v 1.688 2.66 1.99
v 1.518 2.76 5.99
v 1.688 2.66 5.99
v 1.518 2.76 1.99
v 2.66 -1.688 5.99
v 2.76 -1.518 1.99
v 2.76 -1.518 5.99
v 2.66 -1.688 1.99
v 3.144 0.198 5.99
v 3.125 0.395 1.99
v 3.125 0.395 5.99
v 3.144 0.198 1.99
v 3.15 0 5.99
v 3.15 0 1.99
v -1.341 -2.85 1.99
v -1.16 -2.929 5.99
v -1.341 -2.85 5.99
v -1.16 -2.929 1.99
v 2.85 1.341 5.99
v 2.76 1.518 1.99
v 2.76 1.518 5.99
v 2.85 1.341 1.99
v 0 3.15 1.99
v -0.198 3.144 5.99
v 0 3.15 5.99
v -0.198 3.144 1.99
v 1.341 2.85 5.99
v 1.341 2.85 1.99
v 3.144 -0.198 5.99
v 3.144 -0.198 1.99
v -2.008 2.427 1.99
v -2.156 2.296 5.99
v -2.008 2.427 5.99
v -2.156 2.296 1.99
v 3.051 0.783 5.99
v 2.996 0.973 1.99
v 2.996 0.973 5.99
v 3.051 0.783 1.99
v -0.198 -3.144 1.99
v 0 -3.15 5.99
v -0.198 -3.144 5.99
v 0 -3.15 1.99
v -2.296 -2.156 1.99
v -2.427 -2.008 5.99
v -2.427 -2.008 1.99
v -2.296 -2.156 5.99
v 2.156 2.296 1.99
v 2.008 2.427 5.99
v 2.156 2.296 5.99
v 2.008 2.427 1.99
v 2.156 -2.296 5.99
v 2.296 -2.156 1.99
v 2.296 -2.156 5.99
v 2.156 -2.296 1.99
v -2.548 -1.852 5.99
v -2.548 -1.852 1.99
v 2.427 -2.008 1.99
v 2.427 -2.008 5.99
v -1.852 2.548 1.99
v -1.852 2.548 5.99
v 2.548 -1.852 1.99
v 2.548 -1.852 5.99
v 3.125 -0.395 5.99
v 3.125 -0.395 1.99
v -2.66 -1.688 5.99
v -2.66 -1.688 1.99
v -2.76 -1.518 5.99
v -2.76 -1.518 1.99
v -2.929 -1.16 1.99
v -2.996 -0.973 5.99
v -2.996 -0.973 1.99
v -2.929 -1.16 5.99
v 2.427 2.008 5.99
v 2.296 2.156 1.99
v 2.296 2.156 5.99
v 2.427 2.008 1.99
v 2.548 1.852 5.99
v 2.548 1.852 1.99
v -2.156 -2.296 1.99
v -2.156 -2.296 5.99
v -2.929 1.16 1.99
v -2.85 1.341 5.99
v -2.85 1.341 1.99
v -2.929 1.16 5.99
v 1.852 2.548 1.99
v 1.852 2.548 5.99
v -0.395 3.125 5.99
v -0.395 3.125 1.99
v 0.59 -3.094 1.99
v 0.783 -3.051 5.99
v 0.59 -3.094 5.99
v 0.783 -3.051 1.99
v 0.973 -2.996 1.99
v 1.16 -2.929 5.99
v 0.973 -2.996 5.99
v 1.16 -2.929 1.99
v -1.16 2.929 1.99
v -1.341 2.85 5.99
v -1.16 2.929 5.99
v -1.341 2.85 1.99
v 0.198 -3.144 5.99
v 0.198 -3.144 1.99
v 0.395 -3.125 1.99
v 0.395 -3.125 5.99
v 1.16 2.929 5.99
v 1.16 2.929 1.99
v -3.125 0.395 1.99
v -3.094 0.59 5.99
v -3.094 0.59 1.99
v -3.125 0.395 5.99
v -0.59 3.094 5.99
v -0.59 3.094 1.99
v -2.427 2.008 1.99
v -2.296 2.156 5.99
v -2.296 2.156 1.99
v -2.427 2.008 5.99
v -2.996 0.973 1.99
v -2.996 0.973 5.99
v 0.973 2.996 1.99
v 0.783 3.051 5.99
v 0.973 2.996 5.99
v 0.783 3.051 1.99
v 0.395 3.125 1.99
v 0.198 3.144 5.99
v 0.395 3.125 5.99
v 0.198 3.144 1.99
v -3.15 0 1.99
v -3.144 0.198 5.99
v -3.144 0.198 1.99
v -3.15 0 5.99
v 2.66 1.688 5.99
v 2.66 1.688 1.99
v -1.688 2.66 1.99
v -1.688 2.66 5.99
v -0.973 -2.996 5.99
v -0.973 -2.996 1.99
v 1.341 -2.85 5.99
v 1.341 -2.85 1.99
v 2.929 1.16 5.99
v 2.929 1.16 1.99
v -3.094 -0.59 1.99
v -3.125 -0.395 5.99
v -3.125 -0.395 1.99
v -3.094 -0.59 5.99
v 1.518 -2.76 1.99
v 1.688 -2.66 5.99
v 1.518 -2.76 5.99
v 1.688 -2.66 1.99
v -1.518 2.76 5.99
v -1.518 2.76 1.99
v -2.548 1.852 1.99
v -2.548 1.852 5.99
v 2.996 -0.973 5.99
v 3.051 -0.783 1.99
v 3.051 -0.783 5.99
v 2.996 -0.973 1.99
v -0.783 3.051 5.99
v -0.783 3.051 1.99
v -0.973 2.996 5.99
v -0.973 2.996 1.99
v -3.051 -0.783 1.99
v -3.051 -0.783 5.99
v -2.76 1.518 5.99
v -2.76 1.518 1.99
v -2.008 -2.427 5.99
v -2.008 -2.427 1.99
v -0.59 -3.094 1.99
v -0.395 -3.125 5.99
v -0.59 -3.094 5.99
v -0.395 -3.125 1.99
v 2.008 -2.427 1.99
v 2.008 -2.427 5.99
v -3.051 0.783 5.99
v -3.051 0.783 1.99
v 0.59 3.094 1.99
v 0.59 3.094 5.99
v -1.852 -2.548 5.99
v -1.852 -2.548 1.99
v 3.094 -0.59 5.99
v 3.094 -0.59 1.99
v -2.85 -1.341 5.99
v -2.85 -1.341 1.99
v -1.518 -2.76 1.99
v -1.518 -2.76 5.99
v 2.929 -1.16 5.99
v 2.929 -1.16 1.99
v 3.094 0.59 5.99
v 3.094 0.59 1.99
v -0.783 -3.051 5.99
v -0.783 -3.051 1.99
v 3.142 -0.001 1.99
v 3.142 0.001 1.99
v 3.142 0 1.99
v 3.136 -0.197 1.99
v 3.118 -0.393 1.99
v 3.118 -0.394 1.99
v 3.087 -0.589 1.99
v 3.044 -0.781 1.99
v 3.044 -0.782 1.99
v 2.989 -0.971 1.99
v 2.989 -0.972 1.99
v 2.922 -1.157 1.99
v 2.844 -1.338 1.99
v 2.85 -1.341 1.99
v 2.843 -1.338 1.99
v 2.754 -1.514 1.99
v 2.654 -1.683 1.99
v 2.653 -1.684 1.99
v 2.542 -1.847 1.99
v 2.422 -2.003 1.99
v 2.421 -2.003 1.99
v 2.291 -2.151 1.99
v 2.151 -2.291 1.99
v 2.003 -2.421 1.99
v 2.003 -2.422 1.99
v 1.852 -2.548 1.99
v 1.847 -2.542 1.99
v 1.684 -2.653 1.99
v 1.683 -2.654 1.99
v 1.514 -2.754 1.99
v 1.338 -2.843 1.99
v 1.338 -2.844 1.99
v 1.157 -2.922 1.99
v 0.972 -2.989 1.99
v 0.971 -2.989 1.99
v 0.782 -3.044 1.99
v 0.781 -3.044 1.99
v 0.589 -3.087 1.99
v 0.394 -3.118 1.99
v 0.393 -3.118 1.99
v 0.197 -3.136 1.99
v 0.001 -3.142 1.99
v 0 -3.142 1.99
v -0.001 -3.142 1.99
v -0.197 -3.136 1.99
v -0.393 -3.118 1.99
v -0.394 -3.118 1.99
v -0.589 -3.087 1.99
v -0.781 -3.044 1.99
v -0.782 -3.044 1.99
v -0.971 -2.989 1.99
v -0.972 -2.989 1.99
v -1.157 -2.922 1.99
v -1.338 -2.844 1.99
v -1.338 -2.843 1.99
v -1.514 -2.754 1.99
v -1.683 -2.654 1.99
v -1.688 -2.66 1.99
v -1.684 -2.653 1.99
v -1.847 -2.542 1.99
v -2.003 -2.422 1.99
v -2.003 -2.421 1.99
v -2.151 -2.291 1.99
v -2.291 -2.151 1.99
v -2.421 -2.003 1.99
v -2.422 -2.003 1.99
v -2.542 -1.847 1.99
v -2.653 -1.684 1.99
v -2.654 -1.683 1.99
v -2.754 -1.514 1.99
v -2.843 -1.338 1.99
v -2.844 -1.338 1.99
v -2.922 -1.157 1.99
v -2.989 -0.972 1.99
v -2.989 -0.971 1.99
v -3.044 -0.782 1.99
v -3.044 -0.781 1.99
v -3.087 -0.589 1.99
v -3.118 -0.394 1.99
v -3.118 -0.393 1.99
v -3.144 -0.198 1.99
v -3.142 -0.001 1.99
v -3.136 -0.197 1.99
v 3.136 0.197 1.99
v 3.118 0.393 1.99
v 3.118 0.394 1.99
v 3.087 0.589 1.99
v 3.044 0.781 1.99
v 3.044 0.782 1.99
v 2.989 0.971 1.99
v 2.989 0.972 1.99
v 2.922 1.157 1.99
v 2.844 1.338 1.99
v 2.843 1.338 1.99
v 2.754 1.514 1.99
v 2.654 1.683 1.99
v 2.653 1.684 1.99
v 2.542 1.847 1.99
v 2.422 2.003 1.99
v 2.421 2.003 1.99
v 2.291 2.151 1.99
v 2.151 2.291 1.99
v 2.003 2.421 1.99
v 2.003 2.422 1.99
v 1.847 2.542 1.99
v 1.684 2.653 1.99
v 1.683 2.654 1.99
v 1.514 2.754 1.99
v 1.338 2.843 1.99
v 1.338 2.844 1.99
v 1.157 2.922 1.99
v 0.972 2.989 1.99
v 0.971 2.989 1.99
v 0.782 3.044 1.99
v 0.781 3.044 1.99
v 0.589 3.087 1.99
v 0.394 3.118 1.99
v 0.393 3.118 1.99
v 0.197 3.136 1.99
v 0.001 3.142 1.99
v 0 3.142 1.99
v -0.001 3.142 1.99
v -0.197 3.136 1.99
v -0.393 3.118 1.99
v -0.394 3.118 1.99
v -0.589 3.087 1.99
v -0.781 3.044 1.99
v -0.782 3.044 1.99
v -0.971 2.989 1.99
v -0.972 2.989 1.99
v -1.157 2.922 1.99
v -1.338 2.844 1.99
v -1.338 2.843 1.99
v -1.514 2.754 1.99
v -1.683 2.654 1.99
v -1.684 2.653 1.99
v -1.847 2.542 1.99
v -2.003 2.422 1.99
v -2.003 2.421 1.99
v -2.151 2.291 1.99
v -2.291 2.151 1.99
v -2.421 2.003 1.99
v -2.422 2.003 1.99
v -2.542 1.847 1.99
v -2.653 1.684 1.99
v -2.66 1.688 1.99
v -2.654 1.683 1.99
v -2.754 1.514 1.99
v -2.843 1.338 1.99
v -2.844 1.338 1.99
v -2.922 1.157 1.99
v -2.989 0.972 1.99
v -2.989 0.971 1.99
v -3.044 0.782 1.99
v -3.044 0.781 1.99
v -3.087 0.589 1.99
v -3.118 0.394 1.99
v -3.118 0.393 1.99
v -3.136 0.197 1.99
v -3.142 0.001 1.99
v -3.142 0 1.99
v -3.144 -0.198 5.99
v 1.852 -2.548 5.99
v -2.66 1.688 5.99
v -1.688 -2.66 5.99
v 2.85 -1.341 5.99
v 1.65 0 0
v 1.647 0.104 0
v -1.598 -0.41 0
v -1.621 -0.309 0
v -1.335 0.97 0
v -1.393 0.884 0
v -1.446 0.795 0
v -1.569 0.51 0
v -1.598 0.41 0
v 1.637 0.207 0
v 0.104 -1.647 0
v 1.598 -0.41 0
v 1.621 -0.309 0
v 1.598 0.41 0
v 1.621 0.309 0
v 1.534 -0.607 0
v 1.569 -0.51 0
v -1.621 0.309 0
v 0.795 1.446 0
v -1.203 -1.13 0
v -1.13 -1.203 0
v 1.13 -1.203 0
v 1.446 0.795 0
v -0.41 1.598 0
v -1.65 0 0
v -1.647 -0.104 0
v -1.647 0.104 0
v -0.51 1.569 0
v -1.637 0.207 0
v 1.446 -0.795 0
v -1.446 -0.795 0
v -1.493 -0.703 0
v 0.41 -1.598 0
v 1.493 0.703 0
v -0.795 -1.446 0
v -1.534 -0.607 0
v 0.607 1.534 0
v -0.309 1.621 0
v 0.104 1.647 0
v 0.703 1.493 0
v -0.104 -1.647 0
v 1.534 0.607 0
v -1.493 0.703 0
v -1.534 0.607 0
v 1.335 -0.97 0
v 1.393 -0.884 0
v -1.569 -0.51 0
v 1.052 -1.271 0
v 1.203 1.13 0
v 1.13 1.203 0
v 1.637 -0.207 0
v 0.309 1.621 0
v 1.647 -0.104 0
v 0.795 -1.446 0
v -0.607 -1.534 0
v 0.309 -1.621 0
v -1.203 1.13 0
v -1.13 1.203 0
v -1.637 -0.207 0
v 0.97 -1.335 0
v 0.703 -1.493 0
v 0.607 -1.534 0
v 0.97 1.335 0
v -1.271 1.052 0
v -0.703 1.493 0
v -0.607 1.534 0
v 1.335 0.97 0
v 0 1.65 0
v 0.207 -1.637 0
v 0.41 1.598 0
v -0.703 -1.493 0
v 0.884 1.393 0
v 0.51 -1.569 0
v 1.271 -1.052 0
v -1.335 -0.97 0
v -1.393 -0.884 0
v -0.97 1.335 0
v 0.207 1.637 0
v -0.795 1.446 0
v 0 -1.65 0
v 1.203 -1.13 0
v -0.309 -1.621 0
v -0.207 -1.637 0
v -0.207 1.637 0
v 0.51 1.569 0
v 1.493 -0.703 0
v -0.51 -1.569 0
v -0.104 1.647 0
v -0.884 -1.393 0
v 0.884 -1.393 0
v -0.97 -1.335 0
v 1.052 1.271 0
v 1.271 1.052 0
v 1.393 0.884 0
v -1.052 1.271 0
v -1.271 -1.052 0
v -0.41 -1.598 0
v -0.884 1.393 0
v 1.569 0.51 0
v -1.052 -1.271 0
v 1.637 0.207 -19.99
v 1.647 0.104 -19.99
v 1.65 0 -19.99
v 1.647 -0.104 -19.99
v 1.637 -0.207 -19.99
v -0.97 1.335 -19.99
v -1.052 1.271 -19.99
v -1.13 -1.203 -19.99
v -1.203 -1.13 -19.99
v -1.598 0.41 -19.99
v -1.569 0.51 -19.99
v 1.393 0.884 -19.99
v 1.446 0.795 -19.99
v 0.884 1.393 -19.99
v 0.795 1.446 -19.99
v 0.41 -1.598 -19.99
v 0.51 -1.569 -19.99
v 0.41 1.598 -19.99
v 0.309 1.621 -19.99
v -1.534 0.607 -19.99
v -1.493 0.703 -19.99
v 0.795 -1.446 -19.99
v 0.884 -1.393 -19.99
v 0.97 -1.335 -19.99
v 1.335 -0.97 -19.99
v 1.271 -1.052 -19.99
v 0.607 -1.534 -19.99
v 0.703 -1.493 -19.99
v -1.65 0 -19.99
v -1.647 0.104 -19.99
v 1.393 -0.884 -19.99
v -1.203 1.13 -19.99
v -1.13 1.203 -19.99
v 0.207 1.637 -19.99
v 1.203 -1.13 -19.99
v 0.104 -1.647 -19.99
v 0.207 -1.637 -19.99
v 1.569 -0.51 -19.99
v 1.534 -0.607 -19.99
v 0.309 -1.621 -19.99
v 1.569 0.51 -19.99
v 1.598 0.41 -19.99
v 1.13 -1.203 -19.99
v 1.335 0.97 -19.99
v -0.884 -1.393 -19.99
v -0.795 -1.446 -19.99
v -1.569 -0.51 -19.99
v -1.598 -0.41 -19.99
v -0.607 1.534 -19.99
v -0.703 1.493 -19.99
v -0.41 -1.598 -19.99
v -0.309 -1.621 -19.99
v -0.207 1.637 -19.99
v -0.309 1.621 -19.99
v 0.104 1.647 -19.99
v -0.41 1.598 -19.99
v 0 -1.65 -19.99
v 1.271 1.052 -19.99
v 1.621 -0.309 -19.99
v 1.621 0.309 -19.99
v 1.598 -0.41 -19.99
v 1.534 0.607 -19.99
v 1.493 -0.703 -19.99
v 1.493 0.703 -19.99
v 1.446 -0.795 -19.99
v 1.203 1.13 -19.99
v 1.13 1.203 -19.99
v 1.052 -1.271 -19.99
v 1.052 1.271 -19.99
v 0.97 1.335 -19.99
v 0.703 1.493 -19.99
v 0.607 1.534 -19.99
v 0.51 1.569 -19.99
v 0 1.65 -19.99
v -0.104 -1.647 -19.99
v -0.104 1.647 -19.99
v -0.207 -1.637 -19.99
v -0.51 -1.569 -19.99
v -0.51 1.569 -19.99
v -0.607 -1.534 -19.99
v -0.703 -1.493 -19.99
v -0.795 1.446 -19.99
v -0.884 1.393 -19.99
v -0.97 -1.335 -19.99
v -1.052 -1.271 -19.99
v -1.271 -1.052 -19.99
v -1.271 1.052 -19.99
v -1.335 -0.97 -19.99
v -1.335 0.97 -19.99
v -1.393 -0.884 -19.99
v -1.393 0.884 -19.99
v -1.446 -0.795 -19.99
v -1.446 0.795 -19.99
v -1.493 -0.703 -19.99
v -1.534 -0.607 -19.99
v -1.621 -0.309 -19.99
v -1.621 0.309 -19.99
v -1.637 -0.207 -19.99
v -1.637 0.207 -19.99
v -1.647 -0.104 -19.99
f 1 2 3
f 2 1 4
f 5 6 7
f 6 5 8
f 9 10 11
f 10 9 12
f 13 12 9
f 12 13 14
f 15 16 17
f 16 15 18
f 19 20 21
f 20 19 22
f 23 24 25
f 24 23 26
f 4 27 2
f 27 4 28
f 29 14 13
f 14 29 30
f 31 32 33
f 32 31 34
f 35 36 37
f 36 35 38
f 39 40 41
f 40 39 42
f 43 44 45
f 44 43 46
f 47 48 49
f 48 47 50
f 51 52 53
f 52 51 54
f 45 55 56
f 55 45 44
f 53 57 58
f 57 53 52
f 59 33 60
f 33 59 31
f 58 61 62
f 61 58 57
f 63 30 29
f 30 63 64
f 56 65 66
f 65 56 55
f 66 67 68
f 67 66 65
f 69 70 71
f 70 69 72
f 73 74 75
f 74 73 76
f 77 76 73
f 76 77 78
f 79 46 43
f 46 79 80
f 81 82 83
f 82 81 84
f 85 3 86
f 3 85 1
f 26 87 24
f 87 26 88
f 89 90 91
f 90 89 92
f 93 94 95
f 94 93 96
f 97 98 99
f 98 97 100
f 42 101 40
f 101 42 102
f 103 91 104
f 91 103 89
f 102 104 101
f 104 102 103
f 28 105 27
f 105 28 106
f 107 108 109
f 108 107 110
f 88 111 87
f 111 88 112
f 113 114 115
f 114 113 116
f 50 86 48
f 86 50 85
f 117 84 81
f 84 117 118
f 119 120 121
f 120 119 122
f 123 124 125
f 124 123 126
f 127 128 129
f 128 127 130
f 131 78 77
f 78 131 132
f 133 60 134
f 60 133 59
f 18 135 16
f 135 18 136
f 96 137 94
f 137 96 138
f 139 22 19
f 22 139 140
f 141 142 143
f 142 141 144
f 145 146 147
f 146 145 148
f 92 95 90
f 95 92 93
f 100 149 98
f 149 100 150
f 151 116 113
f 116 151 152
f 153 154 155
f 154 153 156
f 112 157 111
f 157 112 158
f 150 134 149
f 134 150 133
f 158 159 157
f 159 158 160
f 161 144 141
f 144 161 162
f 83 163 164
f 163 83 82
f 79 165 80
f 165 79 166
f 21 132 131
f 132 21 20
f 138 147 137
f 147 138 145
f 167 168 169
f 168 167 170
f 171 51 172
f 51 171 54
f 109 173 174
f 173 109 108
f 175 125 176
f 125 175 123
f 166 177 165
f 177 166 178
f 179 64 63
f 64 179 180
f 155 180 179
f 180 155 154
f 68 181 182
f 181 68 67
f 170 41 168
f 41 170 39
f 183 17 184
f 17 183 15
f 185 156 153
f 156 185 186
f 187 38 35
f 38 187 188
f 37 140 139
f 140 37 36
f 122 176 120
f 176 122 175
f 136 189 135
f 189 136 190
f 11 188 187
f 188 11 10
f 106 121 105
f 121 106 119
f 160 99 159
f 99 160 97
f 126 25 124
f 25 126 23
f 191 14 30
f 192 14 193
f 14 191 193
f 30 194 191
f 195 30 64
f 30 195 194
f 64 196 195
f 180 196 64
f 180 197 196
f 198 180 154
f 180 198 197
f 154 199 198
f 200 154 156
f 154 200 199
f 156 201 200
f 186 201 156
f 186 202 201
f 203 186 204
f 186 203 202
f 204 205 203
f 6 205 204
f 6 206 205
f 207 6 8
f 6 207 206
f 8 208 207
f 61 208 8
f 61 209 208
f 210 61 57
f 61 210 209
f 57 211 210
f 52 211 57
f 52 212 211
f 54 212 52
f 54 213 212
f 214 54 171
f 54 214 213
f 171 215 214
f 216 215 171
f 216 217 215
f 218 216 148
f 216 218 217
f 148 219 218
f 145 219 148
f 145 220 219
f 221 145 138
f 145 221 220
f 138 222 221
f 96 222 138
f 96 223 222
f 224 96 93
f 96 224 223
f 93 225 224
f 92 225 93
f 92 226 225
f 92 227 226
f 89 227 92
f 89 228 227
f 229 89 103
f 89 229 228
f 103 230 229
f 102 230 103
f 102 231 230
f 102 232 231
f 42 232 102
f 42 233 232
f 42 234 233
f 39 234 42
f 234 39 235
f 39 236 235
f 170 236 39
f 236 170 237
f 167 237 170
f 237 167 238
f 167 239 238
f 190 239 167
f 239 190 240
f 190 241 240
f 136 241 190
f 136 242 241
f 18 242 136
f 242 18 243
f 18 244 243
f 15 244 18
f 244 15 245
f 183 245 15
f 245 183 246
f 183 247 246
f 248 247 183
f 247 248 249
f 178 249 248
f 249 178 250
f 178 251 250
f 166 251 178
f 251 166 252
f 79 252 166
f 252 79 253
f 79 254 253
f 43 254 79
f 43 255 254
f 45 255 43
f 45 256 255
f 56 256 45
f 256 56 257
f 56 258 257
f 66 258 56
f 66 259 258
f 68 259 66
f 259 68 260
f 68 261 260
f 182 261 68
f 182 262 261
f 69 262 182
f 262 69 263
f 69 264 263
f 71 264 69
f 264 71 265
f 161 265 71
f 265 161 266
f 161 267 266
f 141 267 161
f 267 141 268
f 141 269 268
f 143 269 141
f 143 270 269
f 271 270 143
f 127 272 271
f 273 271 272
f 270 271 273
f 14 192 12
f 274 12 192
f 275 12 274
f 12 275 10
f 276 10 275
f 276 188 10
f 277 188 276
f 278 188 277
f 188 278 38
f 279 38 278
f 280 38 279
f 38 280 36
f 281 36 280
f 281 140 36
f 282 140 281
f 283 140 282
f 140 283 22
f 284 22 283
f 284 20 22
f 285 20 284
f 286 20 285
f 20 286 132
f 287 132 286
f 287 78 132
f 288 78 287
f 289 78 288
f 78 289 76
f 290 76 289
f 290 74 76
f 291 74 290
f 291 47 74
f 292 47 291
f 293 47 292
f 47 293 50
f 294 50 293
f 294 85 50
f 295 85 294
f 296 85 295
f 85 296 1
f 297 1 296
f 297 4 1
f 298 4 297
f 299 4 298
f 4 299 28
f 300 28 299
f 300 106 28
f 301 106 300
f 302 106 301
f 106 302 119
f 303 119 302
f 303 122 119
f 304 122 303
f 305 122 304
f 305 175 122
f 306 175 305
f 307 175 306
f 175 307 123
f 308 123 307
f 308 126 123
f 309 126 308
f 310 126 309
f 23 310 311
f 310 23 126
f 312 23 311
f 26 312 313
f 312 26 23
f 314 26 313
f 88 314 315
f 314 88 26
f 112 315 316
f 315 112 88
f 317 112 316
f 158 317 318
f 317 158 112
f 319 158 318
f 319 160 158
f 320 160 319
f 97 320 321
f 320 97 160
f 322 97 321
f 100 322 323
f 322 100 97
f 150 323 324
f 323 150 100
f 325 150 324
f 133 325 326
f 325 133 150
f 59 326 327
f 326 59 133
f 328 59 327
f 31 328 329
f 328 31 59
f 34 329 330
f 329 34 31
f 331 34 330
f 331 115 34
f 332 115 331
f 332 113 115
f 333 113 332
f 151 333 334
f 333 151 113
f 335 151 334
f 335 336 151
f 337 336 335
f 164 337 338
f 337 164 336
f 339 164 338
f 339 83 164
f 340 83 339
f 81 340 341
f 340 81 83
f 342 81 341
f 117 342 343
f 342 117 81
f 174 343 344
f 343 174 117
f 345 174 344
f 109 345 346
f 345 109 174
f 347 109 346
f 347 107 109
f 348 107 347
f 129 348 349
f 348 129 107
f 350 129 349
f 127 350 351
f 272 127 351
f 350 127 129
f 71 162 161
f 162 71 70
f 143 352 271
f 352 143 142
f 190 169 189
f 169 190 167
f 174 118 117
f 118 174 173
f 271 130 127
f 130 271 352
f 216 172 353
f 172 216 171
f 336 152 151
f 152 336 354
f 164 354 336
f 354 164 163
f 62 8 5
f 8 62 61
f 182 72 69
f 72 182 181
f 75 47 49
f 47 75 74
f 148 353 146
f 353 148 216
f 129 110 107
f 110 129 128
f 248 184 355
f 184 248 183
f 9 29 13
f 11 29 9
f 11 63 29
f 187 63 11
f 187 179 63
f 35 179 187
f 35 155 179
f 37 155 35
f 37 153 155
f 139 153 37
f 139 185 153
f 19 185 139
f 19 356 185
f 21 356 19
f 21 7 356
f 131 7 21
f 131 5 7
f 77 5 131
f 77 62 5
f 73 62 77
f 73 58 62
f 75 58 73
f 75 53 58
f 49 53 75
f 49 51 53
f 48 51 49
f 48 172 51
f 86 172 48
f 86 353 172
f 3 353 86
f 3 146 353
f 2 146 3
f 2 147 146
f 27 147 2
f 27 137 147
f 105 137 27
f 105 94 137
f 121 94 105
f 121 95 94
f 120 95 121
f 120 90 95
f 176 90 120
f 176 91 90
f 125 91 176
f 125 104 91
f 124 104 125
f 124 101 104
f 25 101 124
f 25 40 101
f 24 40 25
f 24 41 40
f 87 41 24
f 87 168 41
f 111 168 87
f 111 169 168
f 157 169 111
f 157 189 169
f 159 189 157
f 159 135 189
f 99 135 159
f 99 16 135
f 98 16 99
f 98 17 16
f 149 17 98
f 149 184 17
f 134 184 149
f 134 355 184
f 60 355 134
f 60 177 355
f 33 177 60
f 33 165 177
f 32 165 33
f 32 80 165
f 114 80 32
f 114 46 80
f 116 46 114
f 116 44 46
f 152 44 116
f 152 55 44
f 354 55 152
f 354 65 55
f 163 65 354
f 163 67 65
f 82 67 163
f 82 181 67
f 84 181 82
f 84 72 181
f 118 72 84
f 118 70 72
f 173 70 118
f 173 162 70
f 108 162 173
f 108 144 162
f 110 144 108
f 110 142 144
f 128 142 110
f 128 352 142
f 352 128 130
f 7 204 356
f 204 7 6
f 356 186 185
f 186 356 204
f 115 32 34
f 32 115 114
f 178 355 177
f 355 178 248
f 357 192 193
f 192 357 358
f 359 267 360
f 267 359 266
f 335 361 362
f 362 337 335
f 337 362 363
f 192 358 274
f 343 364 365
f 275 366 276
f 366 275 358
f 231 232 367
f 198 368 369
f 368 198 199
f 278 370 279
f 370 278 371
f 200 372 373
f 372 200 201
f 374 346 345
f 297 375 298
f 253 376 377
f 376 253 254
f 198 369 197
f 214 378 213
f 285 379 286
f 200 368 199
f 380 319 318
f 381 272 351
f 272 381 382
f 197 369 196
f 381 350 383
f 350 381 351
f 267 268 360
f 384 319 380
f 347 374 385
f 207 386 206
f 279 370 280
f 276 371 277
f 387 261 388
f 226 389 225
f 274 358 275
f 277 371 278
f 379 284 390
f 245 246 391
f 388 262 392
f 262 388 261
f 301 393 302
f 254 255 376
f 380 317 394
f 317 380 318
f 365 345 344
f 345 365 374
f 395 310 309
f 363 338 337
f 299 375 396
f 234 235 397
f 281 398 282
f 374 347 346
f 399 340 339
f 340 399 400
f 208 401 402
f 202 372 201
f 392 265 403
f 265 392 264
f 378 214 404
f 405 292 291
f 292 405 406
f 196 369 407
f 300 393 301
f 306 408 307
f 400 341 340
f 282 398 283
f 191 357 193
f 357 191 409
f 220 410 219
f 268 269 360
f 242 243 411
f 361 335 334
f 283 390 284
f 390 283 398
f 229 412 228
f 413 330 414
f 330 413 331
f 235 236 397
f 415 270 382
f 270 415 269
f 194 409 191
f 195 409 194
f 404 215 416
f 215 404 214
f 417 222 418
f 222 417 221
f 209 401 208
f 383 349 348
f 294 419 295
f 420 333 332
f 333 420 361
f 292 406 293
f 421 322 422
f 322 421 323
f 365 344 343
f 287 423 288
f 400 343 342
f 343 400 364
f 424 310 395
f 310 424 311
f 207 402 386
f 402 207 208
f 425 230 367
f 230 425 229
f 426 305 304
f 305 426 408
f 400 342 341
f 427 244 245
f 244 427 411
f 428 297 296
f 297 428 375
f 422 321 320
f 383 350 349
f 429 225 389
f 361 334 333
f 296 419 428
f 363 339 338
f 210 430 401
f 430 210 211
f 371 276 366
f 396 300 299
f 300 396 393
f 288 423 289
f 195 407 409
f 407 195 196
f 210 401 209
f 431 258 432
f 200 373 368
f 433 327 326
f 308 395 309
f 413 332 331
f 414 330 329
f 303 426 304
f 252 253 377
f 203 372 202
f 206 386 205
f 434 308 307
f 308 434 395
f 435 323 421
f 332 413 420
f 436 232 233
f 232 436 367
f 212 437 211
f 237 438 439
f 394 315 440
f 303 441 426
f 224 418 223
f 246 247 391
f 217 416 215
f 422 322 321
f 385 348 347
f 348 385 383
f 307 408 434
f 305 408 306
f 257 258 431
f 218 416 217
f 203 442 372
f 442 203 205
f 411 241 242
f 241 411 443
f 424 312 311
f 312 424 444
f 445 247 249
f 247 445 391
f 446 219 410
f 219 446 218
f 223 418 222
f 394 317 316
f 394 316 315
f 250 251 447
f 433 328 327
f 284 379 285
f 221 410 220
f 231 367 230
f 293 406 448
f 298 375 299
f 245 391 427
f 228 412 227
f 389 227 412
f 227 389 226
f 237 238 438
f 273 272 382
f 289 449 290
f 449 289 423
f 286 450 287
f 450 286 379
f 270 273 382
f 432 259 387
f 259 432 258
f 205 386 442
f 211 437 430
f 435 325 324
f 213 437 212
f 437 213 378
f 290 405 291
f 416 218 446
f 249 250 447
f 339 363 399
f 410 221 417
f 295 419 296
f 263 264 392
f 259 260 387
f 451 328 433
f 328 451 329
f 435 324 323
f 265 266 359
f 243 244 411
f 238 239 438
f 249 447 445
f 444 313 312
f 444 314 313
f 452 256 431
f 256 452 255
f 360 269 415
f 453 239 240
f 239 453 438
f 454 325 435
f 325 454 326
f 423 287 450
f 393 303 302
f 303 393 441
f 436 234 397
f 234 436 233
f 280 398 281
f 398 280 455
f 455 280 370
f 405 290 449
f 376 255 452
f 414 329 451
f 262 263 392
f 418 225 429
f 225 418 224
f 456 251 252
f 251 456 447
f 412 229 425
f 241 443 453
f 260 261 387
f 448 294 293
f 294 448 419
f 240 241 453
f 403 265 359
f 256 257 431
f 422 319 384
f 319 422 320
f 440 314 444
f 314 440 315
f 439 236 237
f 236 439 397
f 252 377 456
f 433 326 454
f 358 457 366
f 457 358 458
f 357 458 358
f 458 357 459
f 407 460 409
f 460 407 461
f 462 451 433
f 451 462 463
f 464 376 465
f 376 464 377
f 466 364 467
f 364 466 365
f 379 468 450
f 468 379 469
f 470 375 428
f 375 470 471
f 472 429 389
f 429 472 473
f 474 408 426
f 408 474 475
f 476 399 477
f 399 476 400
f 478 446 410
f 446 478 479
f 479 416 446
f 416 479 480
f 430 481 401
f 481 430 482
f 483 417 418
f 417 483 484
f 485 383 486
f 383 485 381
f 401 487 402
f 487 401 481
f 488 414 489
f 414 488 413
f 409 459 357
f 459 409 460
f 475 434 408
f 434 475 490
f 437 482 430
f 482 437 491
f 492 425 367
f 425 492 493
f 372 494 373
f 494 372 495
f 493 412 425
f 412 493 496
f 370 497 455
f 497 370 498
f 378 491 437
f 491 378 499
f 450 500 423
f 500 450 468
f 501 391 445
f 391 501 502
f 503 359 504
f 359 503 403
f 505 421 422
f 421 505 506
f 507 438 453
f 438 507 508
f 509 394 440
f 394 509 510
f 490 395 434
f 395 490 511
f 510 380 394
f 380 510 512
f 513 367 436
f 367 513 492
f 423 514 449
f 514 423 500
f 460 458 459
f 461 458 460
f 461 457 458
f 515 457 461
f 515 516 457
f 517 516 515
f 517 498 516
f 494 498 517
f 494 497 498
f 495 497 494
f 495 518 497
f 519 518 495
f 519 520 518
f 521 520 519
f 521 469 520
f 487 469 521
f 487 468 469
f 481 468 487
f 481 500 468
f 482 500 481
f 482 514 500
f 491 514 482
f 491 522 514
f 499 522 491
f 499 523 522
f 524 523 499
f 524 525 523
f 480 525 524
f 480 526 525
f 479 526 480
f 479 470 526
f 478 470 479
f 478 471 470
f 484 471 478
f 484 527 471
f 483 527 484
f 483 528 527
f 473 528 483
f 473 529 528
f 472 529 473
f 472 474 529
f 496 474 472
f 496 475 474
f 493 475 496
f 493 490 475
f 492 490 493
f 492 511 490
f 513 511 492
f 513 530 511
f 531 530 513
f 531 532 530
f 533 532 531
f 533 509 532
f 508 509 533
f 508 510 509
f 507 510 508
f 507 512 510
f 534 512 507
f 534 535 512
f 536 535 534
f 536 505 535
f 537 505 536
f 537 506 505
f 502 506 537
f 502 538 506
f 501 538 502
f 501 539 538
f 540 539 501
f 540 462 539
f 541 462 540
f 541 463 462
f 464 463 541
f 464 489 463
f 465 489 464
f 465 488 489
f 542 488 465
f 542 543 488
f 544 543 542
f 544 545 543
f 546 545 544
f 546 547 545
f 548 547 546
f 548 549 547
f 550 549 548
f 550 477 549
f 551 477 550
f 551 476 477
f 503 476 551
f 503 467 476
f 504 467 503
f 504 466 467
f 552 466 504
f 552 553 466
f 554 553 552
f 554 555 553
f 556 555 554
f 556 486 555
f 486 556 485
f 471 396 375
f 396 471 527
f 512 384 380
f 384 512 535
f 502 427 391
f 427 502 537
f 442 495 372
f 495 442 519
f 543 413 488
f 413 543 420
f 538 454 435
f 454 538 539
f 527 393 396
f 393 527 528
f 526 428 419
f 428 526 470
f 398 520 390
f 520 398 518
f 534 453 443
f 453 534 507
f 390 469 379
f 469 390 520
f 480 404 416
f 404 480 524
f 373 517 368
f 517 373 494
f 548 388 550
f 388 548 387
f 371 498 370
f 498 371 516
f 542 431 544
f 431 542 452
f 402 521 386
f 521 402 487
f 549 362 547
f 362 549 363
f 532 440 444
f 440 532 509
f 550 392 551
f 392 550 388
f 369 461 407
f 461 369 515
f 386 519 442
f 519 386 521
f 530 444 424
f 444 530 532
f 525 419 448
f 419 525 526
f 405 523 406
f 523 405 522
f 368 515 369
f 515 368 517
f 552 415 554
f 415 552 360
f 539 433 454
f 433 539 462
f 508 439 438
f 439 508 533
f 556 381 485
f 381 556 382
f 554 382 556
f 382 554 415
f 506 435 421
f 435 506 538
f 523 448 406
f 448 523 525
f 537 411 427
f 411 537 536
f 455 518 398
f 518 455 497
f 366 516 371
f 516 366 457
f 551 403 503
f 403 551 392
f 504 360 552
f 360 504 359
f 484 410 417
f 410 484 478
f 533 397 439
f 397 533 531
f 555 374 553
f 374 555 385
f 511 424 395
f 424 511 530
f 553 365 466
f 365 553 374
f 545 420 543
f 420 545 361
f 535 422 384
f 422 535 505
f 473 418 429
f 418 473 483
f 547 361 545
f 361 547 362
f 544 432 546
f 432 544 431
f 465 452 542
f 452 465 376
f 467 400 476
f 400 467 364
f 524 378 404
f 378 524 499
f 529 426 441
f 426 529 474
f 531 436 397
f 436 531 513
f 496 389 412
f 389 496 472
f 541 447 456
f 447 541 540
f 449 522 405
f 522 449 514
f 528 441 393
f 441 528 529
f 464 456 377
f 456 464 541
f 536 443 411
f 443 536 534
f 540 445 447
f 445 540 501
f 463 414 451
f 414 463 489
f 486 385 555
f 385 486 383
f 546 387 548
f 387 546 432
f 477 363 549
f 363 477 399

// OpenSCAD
/**
 * bolt
 * @name bolt
 * @description bolt
 * @type enveloppe
 * @parent root
 */
module bolt($fn = $fn) {
    
    epsilone = 0.01;

    color("DimGray")
    translate([0,0,-20])
        union() {
            translate([0,0,22 - 0.01])
                cylinder(h = 4, d = 6.3, center = false, $fn = $fn);

            translate([0,0,20])
                cylinder(h = 2, d1 = 3.3, d2 = 6.3, center = false, $fn = $fn);
            
            translate([0,0,0.01])
                cylinder(h = 20, d = 3.3, center = false, $fn = $fn);
        }

}

bolt($fn = 100);
